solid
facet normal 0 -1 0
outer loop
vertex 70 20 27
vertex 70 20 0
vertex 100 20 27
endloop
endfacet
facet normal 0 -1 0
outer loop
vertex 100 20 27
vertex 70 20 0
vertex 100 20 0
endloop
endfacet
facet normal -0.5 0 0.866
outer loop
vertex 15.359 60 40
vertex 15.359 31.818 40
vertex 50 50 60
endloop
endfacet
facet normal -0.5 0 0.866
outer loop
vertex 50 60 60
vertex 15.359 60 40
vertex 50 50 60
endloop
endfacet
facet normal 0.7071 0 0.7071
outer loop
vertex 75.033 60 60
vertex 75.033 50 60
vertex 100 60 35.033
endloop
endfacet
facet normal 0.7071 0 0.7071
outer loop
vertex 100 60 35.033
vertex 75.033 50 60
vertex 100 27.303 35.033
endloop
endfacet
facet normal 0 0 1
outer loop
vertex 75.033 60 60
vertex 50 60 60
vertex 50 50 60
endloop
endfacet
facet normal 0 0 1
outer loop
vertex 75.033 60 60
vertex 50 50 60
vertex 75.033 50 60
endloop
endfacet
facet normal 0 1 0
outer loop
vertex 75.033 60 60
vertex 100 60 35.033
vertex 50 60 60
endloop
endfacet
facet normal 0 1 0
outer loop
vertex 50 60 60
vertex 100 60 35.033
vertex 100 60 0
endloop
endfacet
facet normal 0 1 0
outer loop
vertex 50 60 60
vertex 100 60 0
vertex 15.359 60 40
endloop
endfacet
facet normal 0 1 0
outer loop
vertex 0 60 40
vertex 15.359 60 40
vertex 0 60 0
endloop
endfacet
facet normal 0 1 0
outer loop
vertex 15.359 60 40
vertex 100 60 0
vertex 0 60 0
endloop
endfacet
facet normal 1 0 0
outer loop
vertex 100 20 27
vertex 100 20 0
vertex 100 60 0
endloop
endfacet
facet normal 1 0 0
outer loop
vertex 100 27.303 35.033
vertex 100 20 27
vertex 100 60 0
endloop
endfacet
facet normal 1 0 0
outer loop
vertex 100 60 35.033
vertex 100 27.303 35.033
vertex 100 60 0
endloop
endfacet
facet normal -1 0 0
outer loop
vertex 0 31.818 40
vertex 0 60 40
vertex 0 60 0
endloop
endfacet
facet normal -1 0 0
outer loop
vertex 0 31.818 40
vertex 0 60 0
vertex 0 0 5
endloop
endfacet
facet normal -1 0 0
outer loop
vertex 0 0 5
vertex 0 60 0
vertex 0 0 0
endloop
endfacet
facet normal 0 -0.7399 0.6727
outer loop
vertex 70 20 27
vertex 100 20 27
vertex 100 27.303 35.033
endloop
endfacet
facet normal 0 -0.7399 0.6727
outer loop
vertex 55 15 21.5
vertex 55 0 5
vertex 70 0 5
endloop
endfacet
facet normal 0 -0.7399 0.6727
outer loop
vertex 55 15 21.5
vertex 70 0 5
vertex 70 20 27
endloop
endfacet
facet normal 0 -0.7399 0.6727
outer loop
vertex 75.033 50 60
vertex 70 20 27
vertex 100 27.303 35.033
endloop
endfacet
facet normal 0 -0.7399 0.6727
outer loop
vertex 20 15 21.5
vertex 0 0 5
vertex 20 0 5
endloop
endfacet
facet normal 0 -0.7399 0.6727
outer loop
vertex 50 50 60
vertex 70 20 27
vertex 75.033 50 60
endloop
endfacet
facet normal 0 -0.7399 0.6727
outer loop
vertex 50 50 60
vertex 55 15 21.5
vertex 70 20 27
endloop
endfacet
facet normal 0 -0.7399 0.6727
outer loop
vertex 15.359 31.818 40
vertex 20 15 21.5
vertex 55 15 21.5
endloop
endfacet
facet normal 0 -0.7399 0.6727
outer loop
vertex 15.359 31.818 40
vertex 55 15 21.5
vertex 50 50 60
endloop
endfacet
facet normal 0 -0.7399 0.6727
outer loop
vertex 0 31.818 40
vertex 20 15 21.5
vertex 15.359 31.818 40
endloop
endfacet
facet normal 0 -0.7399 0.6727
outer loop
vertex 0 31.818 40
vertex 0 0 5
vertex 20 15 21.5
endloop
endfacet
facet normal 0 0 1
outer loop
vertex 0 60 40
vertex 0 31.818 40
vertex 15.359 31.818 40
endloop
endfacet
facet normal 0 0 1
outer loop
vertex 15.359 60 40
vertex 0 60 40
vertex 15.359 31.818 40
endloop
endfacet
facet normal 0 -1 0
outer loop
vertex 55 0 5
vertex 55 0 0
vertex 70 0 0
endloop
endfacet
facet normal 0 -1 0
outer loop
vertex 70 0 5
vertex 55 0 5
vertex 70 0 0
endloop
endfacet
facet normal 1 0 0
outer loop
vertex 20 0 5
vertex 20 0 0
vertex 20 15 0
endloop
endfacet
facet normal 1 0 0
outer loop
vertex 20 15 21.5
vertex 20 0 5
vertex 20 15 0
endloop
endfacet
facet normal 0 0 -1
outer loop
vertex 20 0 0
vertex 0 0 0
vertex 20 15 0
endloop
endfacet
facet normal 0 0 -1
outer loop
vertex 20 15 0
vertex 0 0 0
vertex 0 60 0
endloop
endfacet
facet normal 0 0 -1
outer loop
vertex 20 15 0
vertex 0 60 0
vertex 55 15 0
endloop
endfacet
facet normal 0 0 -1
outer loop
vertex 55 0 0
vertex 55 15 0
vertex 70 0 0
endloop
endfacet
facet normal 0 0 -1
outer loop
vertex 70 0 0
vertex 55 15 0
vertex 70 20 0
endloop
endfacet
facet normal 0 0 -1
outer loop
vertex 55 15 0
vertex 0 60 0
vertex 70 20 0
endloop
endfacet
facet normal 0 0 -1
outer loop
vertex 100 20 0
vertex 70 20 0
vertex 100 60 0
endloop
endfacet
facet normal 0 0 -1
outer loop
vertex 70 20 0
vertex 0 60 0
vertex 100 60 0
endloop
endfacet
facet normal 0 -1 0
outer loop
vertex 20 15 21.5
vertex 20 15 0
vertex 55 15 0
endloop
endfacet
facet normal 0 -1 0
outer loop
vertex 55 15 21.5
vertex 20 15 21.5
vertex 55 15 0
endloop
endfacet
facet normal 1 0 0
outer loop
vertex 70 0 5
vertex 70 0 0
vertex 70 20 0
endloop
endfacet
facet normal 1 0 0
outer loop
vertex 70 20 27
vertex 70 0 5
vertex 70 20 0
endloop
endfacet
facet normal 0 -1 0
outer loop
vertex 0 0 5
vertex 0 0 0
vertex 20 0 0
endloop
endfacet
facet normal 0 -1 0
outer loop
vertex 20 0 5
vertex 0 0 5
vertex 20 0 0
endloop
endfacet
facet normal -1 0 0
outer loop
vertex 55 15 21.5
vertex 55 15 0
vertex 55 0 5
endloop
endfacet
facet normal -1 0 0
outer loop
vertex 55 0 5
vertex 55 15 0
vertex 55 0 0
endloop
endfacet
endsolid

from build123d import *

# Parameters (mm, degrees)
F1_DEPTH = 60
F3_DEPTH = 60.001
F5_DEPTH = 100.001


with BuildPart() as f1:
    # F0 (on Top) → F1 (new body)
    with BuildSketch(Plane.XY):
        Polygon((0, 60), (0, 0), (20, 0), (20, 15), (55, 15), (55, 0), (70, 0), (70, 20), (100, 20), (100, 60), align=None)
    extrude(amount=F1_DEPTH)

    # F2 (on Front) → F3 (cut, through all)
    with BuildSketch(Plane.XZ):
        Polygon((100, 60), (75.033442, 60), (100, 35.033442), align=None)
        Polygon((15.358984, 40), (50, 60), (0, 60), (0, 40), align=None)
    extrude(amount=-F3_DEPTH, mode=Mode.SUBTRACT)

    # F4 (on Right) → F5 (cut, through all)
    with BuildSketch(Plane.YZ):
        Polygon((20, 27), (50, 60), (20, 60), align=None)
        Polygon((20, 27), (20, 60), (0, 60), (0, 5), align=None)
    extrude(amount=F5_DEPTH, mode=Mode.SUBTRACT)


solid = f1.part
